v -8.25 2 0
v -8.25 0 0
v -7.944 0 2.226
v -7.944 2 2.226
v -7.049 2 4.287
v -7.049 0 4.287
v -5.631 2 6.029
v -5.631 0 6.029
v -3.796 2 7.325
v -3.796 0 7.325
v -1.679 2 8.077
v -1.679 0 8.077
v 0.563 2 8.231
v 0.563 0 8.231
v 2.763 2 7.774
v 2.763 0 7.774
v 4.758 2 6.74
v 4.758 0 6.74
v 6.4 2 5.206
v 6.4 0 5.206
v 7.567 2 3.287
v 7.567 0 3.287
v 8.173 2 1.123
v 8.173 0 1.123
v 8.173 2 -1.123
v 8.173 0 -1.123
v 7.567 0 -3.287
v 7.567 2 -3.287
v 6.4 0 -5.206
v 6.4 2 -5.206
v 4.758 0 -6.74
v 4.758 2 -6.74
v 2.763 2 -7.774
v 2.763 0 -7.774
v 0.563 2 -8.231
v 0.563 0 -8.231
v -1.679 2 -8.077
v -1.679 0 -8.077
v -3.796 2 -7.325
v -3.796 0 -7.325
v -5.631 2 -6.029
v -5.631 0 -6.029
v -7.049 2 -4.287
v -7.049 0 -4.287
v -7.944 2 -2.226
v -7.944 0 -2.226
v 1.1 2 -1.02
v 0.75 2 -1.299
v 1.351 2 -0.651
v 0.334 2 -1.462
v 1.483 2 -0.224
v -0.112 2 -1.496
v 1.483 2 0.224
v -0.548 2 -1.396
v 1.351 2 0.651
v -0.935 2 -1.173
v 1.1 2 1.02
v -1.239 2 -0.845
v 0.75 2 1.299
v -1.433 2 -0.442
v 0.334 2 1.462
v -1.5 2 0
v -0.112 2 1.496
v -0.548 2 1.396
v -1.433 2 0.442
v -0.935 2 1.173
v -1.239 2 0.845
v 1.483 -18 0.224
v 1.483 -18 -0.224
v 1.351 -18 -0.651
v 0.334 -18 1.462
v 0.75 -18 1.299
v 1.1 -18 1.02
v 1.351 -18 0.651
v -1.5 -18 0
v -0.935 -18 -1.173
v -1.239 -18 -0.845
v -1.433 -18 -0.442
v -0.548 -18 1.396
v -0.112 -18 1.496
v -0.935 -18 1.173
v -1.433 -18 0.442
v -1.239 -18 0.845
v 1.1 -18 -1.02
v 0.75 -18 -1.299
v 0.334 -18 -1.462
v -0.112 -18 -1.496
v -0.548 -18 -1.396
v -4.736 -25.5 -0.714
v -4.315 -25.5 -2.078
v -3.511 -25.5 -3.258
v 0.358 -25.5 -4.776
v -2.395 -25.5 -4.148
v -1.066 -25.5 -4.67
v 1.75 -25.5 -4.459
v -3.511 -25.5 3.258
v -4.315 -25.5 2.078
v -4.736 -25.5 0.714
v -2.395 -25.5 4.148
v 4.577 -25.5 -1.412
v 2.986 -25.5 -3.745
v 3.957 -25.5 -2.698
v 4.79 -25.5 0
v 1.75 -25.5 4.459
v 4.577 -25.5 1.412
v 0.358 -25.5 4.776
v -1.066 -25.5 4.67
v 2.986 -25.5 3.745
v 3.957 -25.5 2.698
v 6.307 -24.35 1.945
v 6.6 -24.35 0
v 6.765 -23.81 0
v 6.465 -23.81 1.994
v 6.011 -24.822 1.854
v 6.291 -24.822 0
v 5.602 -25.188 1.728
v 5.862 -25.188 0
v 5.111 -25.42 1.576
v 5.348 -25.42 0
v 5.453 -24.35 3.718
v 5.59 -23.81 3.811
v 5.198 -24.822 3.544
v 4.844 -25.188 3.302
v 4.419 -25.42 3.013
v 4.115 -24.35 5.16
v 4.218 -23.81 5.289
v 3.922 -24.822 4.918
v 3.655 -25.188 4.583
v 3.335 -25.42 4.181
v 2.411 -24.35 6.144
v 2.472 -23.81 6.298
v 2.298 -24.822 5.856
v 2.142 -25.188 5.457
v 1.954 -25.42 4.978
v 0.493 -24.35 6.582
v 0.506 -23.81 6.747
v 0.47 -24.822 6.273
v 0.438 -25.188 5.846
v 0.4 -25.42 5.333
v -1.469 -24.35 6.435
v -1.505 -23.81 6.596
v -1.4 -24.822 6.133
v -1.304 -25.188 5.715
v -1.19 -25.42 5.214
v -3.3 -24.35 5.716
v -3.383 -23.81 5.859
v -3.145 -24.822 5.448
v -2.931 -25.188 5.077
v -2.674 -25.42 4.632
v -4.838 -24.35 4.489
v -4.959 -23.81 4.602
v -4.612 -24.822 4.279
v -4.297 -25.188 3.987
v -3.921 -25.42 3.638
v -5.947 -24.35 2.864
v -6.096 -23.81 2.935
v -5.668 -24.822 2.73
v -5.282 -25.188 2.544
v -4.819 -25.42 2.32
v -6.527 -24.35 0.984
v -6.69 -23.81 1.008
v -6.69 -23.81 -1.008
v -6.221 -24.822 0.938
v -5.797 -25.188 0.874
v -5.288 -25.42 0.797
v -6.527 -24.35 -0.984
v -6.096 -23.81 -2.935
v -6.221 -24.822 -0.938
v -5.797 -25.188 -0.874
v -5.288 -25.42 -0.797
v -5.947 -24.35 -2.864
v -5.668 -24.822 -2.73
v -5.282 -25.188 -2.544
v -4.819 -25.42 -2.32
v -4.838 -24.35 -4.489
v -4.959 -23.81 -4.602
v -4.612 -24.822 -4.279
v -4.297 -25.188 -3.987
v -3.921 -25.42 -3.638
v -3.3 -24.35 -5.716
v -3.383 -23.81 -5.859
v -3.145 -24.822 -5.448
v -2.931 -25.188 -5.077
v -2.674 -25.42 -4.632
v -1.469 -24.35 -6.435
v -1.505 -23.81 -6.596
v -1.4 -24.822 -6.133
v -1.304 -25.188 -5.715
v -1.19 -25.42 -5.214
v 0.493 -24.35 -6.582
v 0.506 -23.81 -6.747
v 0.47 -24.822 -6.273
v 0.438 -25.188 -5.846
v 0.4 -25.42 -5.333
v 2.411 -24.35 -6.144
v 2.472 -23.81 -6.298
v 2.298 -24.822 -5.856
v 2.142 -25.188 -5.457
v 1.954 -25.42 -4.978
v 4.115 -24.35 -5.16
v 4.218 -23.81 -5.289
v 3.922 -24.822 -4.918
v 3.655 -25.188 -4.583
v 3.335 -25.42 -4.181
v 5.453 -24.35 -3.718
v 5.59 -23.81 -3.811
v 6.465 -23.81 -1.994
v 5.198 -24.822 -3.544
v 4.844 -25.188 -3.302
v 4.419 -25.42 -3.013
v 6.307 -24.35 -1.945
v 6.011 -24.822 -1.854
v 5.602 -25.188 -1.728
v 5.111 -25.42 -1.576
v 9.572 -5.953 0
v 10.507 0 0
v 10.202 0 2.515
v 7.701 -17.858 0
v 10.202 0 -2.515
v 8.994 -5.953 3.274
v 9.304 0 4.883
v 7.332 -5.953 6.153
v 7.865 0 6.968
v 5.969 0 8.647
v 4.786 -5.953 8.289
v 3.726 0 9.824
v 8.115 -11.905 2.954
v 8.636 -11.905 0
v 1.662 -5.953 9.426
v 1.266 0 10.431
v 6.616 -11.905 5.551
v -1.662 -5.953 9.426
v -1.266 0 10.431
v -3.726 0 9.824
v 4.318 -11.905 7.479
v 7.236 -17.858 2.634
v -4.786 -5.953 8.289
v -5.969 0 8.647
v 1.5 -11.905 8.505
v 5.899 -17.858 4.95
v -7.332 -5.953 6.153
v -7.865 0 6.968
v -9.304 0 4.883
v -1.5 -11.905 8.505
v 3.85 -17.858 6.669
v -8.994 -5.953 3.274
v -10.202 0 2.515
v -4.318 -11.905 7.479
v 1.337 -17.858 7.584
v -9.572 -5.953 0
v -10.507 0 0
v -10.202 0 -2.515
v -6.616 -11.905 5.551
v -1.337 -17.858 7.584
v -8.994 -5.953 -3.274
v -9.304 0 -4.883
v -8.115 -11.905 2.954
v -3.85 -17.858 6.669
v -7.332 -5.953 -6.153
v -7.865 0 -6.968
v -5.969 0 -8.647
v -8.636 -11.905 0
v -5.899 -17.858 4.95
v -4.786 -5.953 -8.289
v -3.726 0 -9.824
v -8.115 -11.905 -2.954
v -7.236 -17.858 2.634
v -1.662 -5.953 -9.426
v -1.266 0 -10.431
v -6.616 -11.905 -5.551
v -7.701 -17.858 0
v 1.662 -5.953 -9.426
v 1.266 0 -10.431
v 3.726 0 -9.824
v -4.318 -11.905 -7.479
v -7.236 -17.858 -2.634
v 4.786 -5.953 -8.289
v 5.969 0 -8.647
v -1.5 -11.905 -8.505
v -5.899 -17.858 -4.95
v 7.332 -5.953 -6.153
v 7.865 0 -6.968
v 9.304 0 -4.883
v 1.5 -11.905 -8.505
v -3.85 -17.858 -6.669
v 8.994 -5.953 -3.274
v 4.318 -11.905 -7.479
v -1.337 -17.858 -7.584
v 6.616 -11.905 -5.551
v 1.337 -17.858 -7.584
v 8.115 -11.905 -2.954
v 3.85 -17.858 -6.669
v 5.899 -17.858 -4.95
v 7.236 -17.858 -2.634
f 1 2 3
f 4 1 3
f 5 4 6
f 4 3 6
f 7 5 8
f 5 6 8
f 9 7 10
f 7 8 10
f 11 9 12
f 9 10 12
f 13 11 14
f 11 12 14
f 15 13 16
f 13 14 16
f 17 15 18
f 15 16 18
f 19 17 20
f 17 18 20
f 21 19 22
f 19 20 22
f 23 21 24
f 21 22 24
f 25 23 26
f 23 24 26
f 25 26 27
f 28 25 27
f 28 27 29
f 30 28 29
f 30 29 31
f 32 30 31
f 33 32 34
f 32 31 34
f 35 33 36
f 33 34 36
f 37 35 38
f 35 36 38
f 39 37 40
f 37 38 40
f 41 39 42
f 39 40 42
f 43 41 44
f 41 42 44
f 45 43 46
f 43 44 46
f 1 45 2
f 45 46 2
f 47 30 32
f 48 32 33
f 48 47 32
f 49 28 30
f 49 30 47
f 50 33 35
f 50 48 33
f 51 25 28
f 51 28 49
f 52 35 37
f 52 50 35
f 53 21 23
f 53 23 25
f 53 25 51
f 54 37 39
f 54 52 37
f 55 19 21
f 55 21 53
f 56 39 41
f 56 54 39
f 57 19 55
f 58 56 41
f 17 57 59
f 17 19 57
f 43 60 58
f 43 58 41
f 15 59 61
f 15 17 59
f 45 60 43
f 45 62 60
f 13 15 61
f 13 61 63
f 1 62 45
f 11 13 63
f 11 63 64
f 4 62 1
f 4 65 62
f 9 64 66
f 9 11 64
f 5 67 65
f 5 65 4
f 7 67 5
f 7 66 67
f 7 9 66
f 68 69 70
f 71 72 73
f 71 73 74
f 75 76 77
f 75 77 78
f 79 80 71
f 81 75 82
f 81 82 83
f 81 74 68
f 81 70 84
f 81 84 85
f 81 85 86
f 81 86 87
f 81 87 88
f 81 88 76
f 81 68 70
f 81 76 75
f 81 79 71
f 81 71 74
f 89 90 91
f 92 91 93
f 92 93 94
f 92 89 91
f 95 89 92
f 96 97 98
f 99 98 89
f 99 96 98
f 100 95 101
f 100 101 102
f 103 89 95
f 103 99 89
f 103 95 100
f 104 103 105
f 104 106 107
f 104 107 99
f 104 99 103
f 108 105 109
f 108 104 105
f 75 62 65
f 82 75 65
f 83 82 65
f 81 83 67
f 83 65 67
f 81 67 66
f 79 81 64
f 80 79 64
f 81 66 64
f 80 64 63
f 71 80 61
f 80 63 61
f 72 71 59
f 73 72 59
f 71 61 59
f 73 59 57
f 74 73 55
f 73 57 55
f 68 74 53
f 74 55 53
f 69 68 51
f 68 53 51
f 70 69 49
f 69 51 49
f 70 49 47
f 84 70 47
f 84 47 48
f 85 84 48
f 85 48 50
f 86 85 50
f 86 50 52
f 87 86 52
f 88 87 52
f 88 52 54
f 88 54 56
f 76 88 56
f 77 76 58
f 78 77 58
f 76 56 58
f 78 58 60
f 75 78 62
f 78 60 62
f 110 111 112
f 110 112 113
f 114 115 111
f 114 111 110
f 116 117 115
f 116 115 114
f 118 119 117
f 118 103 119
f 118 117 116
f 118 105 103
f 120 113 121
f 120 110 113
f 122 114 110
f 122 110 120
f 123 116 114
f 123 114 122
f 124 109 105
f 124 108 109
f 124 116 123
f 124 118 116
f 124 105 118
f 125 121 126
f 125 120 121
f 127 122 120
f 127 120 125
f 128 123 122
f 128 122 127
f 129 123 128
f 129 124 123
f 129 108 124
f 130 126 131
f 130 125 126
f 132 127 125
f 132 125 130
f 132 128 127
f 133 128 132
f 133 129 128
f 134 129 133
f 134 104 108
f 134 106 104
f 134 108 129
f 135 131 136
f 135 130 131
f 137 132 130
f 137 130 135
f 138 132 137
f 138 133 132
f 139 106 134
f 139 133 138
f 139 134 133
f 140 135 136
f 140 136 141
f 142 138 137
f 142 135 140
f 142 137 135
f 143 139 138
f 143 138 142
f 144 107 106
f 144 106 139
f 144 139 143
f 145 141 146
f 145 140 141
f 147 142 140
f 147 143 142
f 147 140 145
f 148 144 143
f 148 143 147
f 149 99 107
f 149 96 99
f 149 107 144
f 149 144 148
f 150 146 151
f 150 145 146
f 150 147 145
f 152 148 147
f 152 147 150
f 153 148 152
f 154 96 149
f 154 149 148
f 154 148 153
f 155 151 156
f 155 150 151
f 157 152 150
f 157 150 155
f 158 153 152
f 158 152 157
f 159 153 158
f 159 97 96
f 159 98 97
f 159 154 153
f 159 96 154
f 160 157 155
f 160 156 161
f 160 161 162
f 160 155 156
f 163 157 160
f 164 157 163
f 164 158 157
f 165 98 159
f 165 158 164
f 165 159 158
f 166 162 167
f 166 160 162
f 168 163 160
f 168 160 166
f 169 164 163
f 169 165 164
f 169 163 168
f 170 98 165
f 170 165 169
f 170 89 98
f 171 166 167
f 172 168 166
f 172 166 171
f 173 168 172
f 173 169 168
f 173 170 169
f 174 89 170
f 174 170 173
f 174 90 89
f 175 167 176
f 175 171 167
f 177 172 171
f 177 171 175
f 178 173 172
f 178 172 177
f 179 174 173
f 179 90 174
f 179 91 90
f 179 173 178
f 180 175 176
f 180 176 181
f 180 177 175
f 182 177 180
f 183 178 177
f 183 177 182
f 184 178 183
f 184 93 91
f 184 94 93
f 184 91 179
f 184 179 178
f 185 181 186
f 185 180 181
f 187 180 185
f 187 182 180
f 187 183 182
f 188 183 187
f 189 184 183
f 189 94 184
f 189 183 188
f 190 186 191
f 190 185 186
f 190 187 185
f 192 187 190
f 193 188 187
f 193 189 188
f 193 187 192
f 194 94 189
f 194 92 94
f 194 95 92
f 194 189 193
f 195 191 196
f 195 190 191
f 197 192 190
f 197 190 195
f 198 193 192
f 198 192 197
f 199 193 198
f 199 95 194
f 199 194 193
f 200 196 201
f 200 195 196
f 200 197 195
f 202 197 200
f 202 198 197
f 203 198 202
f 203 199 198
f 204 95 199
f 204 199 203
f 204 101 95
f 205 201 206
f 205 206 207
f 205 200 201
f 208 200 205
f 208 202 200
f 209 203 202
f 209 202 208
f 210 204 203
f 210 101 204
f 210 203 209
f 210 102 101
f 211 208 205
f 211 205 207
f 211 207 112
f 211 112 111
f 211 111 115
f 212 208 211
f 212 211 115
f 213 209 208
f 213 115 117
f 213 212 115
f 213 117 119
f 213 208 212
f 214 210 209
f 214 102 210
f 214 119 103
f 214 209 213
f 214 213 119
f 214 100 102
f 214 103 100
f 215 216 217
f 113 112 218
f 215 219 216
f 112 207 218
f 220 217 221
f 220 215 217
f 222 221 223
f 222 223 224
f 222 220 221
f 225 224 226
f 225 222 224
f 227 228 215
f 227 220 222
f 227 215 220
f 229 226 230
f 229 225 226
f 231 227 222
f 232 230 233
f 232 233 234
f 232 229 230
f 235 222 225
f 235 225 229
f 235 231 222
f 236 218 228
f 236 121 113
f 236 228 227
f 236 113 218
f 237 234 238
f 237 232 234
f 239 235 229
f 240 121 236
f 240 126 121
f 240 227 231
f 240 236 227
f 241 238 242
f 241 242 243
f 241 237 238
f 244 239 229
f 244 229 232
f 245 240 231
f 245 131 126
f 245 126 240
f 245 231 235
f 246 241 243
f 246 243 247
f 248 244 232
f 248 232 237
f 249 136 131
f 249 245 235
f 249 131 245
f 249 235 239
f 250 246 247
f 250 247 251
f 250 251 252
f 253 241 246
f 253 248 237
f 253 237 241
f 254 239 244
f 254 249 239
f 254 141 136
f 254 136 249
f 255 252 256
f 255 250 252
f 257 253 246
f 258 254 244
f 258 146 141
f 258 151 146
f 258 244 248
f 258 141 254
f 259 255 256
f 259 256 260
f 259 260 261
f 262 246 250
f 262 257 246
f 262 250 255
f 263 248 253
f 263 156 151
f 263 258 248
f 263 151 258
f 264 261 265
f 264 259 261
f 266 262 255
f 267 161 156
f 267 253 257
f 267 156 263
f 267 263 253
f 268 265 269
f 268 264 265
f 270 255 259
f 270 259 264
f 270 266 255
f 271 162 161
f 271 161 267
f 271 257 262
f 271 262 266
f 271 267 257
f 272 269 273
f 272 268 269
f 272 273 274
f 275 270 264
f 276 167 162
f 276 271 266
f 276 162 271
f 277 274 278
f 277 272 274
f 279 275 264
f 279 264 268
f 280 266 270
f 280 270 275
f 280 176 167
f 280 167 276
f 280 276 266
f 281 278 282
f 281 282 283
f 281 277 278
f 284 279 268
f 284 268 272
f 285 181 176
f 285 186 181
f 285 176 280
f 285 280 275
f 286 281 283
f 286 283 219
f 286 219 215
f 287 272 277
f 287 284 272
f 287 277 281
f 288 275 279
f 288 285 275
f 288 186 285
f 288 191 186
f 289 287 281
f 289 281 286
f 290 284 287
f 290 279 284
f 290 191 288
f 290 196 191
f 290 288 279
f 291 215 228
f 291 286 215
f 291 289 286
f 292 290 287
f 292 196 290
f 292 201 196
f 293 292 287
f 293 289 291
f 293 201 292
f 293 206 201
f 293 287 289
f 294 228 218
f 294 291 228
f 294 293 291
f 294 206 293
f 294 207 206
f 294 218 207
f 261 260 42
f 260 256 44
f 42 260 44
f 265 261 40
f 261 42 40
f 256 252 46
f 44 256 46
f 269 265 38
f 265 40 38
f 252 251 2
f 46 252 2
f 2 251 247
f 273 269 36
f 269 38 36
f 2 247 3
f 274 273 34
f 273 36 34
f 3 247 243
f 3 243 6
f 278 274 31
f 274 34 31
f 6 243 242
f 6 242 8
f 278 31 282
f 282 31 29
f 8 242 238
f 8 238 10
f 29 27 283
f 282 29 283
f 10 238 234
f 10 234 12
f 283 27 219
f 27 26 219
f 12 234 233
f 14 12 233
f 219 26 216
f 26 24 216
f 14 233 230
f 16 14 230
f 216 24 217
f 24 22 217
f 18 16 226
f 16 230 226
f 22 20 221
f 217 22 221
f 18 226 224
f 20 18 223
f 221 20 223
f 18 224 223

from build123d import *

# Parameters (mm, degrees)
F0_R     = 12
F1_DEPTH = 25.5
F3_R     = 2
F4_R     = 8.25
F5_DEPTH = 2
F6_R     = 1.5
F7_DEPTH = 20


# Not quite as in the source:
# - a fillet or chamfer that OpenCascade refuses, or shapes differently, is made with other operations: its cross-section is extruded or revolved along the edge and cut away or added


with BuildPart() as f1:
    # F0 (on Front) → F1 (new body)
    with BuildSketch(Plane.XZ):
        Circle(F0_R)
    extrude(amount=F1_DEPTH)

    # F2: chamfer of 5.5 x 35 on 1 edges, made by hand

    # F2_s1 → F2_t2 (revolve, cut)
    with BuildSketch(Plane.XY):
        Polygon((12, 9.5), (6.5, -25.5), (12, -25.5), align=None)
    revolve(axis=Axis((0, -25.5, 0), (0, -1, 0)), mode=Mode.SUBTRACT)

    # F3
    f3_edges = [f1.edges().sort_by_distance(p)[0] for p in [
        (-6.5, -25.5, 0),
    ]]
    fillet(f3_edges, radius=F3_R)

    # F4 (on face) → F5 (join)
    with BuildSketch(Plane(origin=(0, 0, 0), x_dir=(-1, 0, 0), z_dir=(0, 1, 0))):
        Circle(F4_R)
    extrude(amount=F5_DEPTH)

    # F6 (on face) → F7 (cut)
    with BuildSketch(Plane(origin=(0, 2, 0), x_dir=(-1, 0, 0), z_dir=(0, 1, 0))):
        Circle(F6_R)
    extrude(amount=-F7_DEPTH, mode=Mode.SUBTRACT)


solid = f1.part
